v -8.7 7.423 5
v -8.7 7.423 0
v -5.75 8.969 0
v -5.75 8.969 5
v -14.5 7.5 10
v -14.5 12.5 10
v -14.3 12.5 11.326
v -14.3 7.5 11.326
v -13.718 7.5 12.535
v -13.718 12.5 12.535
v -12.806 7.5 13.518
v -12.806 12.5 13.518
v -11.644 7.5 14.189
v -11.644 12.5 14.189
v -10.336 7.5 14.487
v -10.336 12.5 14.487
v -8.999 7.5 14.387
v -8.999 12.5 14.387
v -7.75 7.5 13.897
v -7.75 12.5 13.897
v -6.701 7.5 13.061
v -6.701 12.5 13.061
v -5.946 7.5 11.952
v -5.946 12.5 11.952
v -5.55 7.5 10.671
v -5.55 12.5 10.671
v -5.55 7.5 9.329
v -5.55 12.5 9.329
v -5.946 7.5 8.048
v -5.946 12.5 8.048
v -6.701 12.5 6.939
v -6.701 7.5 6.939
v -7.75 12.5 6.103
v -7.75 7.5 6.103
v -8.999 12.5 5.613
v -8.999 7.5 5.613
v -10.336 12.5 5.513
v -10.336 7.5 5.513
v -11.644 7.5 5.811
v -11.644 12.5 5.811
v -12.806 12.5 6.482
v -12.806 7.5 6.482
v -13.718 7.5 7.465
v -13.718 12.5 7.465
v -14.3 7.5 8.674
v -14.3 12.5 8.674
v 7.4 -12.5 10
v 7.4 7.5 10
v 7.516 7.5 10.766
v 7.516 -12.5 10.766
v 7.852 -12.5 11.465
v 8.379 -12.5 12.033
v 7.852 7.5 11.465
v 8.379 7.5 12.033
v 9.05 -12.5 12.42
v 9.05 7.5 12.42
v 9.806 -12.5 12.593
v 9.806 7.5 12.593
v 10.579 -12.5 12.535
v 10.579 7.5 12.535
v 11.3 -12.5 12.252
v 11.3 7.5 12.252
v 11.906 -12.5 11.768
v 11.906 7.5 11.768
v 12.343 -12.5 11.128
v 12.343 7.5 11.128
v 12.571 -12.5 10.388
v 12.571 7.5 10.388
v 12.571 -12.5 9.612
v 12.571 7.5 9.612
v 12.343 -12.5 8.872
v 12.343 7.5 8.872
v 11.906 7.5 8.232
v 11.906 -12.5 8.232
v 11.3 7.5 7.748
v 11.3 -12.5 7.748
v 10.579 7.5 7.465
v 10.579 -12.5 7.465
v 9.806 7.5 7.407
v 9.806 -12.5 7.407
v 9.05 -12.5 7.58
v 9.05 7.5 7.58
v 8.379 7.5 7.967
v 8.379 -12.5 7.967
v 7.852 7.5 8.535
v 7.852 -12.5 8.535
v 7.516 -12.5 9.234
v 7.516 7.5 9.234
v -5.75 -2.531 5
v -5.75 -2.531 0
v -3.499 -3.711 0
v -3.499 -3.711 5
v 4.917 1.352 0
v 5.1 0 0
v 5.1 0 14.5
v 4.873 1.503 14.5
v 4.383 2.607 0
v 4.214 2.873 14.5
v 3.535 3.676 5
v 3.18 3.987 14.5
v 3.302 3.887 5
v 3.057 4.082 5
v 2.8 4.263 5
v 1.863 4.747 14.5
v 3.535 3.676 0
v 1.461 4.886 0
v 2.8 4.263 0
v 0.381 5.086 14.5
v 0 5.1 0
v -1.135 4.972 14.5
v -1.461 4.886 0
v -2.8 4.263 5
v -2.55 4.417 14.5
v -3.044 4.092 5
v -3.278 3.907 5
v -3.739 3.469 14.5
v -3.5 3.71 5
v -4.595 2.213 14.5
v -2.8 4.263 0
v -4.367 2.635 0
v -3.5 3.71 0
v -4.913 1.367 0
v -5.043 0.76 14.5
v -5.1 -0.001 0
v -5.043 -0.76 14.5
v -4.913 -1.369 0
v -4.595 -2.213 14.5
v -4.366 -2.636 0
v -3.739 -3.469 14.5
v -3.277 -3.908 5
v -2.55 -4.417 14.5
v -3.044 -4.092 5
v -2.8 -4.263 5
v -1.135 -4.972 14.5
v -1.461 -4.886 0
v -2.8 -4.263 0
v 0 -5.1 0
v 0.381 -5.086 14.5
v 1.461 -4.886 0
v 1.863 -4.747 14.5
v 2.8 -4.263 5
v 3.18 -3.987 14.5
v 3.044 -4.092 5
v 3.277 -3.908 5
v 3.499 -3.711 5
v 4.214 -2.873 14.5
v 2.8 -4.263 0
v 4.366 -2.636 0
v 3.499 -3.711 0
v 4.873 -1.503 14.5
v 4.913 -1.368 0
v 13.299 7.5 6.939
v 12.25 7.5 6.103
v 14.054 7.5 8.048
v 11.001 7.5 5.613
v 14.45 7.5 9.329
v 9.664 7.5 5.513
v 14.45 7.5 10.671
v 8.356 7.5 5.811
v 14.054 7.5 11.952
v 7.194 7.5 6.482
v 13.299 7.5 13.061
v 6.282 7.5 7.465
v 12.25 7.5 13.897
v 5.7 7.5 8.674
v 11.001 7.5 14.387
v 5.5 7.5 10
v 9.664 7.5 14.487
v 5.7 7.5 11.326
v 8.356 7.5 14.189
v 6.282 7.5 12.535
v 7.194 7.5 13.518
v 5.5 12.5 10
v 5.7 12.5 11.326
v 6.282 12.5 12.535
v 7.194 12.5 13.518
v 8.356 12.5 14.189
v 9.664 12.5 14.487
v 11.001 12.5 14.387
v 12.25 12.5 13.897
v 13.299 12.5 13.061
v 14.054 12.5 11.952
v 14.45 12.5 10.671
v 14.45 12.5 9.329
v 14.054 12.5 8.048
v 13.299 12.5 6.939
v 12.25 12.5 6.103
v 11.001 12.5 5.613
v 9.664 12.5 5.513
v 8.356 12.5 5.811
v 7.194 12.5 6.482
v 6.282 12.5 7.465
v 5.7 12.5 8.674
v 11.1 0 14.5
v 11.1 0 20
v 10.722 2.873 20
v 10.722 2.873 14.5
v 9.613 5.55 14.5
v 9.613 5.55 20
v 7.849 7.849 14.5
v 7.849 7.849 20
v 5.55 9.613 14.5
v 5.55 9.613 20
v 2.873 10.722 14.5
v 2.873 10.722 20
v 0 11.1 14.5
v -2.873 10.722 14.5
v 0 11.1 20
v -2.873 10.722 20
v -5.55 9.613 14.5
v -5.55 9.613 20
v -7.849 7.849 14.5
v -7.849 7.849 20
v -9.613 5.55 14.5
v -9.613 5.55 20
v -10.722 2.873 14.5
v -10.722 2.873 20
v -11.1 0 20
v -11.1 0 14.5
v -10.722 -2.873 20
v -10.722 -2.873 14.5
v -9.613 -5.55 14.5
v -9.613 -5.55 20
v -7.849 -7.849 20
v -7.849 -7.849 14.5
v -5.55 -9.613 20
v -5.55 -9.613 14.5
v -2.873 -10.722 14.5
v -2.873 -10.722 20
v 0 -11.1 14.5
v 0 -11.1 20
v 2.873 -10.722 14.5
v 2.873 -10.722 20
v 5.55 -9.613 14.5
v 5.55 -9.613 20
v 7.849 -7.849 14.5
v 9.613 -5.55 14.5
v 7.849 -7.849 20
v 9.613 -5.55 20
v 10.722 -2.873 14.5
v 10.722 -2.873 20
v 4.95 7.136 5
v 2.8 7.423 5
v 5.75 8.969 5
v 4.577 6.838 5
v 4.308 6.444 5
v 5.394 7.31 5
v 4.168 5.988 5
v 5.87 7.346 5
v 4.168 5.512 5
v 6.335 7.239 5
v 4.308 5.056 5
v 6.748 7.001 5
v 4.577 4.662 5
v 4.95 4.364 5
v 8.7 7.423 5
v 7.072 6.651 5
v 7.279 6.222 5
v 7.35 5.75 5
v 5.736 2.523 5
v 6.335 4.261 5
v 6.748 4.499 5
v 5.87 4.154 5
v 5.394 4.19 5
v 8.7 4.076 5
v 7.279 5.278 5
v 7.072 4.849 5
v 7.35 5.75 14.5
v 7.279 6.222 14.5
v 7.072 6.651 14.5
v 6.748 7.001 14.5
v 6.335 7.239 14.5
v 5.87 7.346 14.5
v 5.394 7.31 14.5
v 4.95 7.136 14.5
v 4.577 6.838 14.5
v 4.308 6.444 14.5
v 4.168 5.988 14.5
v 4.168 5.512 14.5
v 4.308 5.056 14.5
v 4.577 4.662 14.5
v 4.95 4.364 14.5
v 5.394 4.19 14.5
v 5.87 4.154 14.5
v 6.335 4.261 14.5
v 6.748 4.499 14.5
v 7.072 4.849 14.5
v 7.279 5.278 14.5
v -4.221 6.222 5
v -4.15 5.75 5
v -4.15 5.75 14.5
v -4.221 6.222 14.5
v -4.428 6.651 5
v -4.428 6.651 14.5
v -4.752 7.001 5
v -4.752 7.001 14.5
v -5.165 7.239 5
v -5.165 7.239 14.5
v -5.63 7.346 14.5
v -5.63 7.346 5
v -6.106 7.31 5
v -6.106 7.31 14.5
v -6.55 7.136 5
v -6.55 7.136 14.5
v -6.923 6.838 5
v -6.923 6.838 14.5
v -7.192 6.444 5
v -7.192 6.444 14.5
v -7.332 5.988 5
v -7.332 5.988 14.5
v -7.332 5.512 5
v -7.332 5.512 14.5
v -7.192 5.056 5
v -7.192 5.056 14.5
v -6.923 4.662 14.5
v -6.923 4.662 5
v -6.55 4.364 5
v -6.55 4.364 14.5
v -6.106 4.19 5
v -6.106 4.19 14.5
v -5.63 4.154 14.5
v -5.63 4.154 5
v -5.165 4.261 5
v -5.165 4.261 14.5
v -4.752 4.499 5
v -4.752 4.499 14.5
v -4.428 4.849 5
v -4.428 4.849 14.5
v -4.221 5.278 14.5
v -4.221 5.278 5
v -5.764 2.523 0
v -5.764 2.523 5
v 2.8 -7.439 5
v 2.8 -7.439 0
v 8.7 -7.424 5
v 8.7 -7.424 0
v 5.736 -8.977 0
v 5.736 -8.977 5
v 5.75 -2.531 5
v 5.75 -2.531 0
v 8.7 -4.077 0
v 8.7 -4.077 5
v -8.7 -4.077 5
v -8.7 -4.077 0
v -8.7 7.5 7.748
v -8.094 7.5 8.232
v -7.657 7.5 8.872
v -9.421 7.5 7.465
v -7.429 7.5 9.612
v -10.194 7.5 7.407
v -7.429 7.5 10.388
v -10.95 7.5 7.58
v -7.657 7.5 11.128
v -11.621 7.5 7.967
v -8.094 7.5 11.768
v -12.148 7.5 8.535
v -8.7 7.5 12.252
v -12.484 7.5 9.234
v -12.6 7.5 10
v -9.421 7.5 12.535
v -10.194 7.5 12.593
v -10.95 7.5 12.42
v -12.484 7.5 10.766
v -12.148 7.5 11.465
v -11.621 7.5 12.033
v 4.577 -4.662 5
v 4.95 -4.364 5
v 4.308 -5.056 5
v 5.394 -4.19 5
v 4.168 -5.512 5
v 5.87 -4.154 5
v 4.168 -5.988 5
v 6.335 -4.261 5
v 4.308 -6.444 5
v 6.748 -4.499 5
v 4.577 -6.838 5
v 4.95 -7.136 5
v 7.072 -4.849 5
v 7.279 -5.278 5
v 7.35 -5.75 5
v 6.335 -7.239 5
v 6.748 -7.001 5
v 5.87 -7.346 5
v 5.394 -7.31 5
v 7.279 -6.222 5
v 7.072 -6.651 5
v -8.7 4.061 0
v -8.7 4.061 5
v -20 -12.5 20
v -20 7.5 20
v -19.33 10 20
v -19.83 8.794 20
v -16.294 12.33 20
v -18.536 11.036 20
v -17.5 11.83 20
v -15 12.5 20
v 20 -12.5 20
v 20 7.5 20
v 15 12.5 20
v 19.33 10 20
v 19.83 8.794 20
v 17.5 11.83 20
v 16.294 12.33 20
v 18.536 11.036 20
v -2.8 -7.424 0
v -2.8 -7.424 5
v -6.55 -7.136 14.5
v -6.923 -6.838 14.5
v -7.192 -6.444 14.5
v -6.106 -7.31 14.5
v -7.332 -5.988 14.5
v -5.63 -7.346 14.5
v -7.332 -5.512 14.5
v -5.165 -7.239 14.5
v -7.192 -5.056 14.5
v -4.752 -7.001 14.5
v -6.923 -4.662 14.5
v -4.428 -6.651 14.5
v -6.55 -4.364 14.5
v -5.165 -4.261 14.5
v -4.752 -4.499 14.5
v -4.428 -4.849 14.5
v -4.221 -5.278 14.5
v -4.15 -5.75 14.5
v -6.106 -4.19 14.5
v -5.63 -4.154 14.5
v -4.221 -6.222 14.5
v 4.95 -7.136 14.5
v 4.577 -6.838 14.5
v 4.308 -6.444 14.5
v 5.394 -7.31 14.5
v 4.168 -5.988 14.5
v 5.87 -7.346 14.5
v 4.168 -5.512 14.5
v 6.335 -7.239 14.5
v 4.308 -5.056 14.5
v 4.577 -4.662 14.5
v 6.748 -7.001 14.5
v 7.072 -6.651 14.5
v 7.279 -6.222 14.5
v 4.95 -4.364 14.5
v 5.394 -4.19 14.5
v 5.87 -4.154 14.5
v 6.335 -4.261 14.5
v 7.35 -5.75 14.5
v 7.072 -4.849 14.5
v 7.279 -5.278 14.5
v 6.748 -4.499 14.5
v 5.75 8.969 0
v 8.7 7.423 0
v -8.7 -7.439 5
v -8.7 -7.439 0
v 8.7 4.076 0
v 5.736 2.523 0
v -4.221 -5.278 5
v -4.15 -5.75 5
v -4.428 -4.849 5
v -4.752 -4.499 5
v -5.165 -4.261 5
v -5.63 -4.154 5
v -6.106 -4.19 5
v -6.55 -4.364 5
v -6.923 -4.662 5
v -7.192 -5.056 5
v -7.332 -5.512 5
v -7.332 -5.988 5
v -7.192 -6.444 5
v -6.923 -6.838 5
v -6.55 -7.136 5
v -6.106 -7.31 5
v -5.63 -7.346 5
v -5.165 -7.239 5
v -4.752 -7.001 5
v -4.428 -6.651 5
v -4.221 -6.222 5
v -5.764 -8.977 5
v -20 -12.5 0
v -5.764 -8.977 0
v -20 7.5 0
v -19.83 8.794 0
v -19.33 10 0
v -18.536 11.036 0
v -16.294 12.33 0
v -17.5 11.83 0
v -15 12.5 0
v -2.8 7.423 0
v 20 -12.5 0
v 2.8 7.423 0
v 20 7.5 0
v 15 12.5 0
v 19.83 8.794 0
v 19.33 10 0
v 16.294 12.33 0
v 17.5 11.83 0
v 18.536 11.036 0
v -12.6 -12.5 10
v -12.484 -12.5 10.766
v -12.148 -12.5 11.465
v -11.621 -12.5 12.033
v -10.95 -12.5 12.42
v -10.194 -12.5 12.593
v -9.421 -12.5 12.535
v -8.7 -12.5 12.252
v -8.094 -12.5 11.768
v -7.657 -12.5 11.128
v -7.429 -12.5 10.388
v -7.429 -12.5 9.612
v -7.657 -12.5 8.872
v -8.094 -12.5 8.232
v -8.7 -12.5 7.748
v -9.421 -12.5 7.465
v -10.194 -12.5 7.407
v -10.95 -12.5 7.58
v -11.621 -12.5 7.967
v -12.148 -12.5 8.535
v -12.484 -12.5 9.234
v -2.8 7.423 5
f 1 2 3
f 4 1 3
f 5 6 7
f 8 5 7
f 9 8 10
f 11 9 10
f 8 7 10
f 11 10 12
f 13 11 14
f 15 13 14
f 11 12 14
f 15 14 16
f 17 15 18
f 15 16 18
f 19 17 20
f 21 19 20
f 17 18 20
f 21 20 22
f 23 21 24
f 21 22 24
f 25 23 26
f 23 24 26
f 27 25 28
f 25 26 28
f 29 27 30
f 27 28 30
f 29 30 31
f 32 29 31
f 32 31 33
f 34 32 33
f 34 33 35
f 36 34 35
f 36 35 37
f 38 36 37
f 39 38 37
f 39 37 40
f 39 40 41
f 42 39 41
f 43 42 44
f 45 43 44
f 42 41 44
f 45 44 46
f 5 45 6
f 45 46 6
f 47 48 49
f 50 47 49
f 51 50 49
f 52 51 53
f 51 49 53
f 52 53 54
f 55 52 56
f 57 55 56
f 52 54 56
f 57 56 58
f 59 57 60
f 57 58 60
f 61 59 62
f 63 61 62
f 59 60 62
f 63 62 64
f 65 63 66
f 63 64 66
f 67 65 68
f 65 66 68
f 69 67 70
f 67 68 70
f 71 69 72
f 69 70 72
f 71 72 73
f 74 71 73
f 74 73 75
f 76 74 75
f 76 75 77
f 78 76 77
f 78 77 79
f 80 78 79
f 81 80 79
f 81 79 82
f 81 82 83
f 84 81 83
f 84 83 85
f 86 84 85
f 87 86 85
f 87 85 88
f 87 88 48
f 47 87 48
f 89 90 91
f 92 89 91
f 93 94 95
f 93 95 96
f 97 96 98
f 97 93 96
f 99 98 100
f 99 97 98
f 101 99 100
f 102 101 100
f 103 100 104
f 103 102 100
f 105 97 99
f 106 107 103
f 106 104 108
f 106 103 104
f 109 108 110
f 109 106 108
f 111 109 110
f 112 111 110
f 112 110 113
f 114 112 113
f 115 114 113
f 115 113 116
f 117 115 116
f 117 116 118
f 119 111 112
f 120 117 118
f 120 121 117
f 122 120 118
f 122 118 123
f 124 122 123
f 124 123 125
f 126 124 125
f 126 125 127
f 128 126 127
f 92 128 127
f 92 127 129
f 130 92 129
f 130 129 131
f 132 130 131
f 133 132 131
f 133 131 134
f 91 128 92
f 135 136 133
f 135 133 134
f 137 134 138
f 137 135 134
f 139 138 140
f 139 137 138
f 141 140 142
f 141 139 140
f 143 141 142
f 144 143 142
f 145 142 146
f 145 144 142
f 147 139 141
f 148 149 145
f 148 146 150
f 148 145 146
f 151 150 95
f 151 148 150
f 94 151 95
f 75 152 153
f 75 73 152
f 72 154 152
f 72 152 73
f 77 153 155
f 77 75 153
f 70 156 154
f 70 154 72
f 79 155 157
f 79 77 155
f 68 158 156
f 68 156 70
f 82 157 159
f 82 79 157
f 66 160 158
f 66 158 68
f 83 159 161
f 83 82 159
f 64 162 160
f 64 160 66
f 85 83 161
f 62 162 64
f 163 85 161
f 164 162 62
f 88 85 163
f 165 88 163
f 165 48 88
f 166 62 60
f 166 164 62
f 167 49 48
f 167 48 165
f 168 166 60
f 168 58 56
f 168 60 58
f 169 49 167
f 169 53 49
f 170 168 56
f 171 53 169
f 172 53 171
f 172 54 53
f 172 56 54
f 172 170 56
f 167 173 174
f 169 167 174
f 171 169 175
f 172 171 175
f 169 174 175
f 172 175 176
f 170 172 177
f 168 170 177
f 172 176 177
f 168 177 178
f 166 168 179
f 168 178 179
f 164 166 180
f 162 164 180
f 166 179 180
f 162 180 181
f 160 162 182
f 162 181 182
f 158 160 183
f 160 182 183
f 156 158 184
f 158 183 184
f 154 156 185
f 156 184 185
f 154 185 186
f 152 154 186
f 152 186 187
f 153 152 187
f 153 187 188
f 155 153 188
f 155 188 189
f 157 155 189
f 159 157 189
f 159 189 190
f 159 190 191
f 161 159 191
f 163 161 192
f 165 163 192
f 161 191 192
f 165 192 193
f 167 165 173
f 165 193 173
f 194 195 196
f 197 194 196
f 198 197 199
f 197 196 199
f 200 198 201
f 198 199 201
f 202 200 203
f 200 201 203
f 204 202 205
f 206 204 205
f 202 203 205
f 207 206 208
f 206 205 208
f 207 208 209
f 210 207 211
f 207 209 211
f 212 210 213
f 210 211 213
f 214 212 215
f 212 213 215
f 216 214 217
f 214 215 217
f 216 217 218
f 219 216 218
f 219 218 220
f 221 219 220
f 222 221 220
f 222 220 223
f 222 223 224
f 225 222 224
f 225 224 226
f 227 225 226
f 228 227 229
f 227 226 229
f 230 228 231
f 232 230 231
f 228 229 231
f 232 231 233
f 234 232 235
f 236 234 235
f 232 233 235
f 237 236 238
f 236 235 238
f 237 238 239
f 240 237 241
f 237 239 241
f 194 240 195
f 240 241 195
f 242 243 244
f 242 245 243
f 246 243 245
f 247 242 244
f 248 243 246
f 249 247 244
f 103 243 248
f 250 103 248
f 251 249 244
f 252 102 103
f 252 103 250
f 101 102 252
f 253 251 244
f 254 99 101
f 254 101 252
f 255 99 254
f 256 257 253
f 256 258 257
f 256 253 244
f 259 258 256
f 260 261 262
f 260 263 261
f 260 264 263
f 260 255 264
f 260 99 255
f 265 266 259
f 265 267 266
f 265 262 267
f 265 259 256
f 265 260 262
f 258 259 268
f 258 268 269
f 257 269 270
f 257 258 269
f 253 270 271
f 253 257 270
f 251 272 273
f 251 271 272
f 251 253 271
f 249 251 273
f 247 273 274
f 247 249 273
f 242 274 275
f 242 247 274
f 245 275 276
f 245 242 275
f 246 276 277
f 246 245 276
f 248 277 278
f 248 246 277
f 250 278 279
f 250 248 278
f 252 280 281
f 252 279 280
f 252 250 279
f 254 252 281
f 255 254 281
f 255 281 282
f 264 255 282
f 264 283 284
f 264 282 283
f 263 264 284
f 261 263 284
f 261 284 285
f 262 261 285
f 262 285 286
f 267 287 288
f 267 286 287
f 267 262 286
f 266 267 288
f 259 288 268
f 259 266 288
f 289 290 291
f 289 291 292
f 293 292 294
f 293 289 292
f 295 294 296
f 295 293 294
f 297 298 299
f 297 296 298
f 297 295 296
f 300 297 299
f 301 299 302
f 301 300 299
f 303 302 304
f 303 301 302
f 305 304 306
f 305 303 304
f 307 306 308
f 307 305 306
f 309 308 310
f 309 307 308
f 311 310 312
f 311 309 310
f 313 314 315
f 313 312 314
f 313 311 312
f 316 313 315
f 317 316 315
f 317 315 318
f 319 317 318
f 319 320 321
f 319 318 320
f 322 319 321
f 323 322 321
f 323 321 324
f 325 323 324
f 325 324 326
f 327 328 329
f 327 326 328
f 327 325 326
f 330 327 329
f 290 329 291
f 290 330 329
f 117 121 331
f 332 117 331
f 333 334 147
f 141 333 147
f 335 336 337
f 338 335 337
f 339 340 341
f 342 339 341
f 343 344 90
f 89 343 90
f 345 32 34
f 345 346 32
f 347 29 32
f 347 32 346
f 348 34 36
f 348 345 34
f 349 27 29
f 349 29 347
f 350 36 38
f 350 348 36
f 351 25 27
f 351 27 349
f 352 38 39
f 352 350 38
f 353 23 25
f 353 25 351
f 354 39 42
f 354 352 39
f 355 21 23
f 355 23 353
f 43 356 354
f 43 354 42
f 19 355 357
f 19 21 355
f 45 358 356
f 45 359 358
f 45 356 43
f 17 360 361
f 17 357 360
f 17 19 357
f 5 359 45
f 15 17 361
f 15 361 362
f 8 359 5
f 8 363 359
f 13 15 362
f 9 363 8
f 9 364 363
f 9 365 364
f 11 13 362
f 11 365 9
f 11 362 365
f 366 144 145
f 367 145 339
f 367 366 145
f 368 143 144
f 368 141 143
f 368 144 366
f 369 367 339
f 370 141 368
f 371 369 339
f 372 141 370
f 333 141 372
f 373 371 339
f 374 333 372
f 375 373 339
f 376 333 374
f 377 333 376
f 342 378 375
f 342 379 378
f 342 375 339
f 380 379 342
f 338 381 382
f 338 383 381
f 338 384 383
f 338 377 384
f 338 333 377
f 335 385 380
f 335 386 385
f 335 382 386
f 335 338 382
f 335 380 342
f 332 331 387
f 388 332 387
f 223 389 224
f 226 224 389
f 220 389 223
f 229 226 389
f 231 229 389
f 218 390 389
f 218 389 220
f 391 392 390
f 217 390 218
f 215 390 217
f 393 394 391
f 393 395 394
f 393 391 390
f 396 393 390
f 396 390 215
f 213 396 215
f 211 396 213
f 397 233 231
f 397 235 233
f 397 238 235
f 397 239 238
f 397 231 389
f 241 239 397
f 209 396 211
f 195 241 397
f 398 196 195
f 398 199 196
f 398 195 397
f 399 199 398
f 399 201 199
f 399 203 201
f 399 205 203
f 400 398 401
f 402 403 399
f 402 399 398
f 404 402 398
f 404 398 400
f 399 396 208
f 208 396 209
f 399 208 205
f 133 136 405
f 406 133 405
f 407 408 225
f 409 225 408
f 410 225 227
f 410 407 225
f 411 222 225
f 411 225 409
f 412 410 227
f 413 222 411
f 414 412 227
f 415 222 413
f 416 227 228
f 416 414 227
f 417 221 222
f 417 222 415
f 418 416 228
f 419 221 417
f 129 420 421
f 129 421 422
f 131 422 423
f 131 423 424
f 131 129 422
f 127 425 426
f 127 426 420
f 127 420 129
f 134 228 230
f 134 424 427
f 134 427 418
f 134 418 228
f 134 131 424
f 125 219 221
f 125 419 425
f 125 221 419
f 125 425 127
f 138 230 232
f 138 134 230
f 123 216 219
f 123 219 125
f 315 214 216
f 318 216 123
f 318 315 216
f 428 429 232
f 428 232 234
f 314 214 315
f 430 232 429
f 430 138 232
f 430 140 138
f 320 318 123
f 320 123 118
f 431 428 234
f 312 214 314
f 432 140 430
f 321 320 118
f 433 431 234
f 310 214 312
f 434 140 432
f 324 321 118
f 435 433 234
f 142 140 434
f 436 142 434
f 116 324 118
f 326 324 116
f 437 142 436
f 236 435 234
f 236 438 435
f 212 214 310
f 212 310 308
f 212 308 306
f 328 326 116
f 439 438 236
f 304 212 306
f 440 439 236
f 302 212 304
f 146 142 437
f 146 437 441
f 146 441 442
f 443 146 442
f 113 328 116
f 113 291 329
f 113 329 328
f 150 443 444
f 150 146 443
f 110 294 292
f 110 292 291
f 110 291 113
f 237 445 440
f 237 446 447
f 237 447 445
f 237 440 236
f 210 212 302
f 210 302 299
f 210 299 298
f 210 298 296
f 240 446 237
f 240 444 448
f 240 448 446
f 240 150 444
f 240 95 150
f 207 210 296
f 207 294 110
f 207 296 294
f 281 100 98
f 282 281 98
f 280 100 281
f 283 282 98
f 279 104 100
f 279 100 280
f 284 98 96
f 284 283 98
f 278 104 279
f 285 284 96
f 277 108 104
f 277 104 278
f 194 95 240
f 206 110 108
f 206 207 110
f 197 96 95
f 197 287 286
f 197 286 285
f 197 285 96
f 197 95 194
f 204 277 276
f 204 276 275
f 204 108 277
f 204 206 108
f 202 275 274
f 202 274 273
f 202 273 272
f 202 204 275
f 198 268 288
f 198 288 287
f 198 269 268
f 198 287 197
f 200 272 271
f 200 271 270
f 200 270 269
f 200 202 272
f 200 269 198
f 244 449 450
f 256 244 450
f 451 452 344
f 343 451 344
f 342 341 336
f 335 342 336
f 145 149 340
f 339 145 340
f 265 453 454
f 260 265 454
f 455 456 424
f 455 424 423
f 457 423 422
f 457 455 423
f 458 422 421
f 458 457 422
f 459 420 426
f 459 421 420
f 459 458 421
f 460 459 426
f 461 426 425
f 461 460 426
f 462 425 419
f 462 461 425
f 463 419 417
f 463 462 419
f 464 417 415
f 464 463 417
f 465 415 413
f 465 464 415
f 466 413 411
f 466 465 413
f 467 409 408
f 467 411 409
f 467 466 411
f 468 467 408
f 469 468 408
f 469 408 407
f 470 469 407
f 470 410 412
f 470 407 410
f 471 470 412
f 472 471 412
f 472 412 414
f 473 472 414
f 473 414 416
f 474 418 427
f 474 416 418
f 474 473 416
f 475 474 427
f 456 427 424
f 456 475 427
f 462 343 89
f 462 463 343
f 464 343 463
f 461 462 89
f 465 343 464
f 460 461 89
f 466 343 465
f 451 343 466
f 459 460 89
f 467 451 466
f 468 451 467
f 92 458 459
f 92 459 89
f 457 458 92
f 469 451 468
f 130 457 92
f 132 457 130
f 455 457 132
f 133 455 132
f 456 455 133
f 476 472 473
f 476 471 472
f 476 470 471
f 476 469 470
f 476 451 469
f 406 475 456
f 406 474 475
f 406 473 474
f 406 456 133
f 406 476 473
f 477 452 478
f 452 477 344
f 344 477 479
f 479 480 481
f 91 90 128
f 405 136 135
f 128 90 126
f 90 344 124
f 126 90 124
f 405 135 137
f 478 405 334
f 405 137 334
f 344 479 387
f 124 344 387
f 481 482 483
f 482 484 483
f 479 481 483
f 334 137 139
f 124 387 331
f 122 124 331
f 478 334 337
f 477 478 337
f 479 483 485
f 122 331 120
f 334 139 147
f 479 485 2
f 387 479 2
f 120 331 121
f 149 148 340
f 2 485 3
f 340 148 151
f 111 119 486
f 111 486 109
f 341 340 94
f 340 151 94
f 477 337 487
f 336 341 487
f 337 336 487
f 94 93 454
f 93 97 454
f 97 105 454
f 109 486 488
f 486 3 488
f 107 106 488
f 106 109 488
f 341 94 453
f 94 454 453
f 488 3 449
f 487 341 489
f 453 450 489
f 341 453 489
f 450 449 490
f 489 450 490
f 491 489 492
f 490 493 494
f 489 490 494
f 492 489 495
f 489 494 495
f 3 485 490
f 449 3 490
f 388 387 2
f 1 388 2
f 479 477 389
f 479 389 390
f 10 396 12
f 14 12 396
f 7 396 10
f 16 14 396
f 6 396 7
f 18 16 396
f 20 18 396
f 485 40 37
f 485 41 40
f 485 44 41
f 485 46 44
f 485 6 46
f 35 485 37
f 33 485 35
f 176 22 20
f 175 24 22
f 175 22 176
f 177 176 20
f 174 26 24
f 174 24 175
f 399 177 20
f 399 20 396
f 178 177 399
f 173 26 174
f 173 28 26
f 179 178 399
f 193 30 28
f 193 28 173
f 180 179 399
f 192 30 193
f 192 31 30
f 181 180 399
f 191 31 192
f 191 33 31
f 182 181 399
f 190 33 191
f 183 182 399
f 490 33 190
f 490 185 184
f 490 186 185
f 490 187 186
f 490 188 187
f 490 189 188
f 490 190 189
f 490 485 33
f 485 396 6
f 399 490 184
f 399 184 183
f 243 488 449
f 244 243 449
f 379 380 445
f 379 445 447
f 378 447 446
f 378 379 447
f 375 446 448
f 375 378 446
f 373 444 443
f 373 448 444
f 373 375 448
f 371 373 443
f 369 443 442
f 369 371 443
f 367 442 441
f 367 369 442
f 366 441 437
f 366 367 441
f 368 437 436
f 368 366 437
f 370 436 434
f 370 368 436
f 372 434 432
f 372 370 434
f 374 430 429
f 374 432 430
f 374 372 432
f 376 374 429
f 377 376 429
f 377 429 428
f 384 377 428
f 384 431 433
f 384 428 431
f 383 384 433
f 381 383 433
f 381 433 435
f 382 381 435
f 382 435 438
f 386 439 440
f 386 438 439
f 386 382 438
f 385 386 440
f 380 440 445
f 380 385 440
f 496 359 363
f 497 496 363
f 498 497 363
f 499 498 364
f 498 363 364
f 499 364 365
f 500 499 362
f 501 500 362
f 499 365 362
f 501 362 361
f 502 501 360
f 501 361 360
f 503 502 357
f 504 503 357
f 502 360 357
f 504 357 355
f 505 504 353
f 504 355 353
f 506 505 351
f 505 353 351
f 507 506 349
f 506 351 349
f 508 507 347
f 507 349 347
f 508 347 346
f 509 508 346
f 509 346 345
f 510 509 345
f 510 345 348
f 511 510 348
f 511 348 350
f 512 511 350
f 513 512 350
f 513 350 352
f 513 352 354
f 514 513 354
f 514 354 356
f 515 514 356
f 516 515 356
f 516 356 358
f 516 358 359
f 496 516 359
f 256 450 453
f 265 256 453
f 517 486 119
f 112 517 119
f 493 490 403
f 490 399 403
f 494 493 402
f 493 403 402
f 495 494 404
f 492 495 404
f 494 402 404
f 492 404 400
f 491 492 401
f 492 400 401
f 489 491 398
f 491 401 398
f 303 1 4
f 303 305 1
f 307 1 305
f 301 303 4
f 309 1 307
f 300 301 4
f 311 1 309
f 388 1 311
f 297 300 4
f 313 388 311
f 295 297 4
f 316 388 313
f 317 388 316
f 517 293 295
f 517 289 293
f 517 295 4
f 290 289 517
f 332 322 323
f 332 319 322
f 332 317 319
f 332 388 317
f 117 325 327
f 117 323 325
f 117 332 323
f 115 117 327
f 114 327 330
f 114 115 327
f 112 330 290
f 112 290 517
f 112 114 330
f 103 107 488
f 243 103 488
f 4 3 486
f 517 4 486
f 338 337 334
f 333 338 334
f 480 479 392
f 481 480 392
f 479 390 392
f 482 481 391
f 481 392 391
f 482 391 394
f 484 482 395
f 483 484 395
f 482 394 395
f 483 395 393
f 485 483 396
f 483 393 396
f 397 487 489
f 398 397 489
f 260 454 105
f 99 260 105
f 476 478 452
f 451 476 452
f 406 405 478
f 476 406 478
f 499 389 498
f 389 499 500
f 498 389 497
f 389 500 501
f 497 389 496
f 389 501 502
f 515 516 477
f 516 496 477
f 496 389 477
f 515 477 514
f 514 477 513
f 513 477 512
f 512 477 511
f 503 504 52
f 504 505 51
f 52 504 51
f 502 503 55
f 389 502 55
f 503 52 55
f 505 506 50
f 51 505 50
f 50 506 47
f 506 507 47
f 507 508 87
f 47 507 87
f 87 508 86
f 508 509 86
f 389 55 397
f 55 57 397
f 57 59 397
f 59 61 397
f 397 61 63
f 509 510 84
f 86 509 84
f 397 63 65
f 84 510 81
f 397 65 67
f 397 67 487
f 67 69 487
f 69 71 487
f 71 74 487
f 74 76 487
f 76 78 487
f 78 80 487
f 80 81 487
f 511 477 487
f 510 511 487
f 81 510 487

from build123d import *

# Parameters (mm, degrees)
F0_W      = 40
F0_H      = 25
F0_R      = 1.6
F0_R_2    = 5.1
F1_DEPTH  = 20
F2_R      = 5
F3_R      = 11.1
F4_DEPTH  = 5.5
F5_R      = 1.6
F6_DEPTH  = 5
F7_R      = 2.6
F8_DEPTH  = 25.001
F9_R      = 4.5
F9_R_2    = 2.6
F10_DEPTH = 5


with BuildPart() as f1:
    # F0 (on Top) → F1 (new body)
    with BuildSketch(Plane.XY):
        Rectangle(F0_W, F0_H)
        with Locations((-5.75, -5.75)):
            Circle(F0_R, mode=Mode.SUBTRACT)
        with Locations((5.75, -5.75)):
            Circle(F0_R, mode=Mode.SUBTRACT)
        with Locations((-5.75, 5.75)):
            Circle(F0_R, mode=Mode.SUBTRACT)
        Circle(F0_R_2, mode=Mode.SUBTRACT)
        with Locations((5.75, 5.75)):
            Circle(F0_R, mode=Mode.SUBTRACT)
    extrude(amount=F1_DEPTH)

    # F2
    f2_edges = [f1.edges().sort_by_distance(p)[0] for p in [
        (20, 12.5, 10),
        (-20, 12.5, 10),
    ]]
    fillet(f2_edges, radius=F2_R)

    # F3 (on face) → F4 (cut)
    with BuildSketch(Plane.XY.offset(20)):
        Circle(F3_R)
    extrude(amount=-F4_DEPTH, mode=Mode.SUBTRACT)

    # F5 (on face) → F6 (cut)
    with BuildSketch(Plane(origin=(0, 0, 0), x_dir=(1, 0, 0), z_dir=(0, 0, -1))):
        Polygon((8.7, 7.423624), (5.735692, 8.977306), (2.8, 7.438623), (2.8, 4.076827), (5.75, 2.530645), (8.7, 4.076827), align=None)
        Polygon((8.7, -4.076376), (5.735692, -2.522694), (2.8, -4.061377), (2.8, -7.423173), (5.75, -8.969355), (8.7, -7.423173), align=None)
        with Locations((5.75, -5.75)):
            Circle(F5_R, mode=Mode.SUBTRACT)
        Polygon((-2.8, -4.076376), (-5.764308, -2.522694), (-8.7, -4.061377), (-8.7, -7.423173), (-5.75, -8.969355), (-2.8, -7.423173), align=None)
        with Locations((-5.75, -5.75)):
            Circle(F5_R, mode=Mode.SUBTRACT)
        Polygon((-2.8, 7.423624), (-5.764308, 8.977306), (-8.7, 7.438623), (-8.7, 4.076827), (-5.75, 2.530645), (-2.8, 4.076827), align=None)
        with Locations((-5.75, 5.75)):
            Circle(F5_R, mode=Mode.SUBTRACT)
    extrude(amount=-F6_DEPTH, mode=Mode.SUBTRACT)

    # F7 (on face) → F8 (cut, through all)
    with BuildSketch(Plane(origin=(0, 12.5, 0), x_dir=(-1, 0, 0), z_dir=(0, 1, 0))):
        with Locations((-10, 10)):
            Circle(F7_R)
        with Locations((10, 10)):
            Circle(F7_R)
    extrude(amount=-F8_DEPTH, mode=Mode.SUBTRACT)

    # F9 (on face) → F10 (cut)
    with BuildSketch(Plane(origin=(0, 12.5, 0), x_dir=(-1, 0, 0), z_dir=(0, 1, 0))):
        with Locations((10, 10)):
            Circle(F9_R)
        with Locations((10, 10)):
            Circle(F9_R_2, mode=Mode.SUBTRACT)
        with Locations((-10, 10)):
            Circle(F9_R)
        with Locations((-10, 10)):
            Circle(F9_R_2, mode=Mode.SUBTRACT)
    extrude(amount=-F10_DEPTH, mode=Mode.SUBTRACT)


solid = f1.part
